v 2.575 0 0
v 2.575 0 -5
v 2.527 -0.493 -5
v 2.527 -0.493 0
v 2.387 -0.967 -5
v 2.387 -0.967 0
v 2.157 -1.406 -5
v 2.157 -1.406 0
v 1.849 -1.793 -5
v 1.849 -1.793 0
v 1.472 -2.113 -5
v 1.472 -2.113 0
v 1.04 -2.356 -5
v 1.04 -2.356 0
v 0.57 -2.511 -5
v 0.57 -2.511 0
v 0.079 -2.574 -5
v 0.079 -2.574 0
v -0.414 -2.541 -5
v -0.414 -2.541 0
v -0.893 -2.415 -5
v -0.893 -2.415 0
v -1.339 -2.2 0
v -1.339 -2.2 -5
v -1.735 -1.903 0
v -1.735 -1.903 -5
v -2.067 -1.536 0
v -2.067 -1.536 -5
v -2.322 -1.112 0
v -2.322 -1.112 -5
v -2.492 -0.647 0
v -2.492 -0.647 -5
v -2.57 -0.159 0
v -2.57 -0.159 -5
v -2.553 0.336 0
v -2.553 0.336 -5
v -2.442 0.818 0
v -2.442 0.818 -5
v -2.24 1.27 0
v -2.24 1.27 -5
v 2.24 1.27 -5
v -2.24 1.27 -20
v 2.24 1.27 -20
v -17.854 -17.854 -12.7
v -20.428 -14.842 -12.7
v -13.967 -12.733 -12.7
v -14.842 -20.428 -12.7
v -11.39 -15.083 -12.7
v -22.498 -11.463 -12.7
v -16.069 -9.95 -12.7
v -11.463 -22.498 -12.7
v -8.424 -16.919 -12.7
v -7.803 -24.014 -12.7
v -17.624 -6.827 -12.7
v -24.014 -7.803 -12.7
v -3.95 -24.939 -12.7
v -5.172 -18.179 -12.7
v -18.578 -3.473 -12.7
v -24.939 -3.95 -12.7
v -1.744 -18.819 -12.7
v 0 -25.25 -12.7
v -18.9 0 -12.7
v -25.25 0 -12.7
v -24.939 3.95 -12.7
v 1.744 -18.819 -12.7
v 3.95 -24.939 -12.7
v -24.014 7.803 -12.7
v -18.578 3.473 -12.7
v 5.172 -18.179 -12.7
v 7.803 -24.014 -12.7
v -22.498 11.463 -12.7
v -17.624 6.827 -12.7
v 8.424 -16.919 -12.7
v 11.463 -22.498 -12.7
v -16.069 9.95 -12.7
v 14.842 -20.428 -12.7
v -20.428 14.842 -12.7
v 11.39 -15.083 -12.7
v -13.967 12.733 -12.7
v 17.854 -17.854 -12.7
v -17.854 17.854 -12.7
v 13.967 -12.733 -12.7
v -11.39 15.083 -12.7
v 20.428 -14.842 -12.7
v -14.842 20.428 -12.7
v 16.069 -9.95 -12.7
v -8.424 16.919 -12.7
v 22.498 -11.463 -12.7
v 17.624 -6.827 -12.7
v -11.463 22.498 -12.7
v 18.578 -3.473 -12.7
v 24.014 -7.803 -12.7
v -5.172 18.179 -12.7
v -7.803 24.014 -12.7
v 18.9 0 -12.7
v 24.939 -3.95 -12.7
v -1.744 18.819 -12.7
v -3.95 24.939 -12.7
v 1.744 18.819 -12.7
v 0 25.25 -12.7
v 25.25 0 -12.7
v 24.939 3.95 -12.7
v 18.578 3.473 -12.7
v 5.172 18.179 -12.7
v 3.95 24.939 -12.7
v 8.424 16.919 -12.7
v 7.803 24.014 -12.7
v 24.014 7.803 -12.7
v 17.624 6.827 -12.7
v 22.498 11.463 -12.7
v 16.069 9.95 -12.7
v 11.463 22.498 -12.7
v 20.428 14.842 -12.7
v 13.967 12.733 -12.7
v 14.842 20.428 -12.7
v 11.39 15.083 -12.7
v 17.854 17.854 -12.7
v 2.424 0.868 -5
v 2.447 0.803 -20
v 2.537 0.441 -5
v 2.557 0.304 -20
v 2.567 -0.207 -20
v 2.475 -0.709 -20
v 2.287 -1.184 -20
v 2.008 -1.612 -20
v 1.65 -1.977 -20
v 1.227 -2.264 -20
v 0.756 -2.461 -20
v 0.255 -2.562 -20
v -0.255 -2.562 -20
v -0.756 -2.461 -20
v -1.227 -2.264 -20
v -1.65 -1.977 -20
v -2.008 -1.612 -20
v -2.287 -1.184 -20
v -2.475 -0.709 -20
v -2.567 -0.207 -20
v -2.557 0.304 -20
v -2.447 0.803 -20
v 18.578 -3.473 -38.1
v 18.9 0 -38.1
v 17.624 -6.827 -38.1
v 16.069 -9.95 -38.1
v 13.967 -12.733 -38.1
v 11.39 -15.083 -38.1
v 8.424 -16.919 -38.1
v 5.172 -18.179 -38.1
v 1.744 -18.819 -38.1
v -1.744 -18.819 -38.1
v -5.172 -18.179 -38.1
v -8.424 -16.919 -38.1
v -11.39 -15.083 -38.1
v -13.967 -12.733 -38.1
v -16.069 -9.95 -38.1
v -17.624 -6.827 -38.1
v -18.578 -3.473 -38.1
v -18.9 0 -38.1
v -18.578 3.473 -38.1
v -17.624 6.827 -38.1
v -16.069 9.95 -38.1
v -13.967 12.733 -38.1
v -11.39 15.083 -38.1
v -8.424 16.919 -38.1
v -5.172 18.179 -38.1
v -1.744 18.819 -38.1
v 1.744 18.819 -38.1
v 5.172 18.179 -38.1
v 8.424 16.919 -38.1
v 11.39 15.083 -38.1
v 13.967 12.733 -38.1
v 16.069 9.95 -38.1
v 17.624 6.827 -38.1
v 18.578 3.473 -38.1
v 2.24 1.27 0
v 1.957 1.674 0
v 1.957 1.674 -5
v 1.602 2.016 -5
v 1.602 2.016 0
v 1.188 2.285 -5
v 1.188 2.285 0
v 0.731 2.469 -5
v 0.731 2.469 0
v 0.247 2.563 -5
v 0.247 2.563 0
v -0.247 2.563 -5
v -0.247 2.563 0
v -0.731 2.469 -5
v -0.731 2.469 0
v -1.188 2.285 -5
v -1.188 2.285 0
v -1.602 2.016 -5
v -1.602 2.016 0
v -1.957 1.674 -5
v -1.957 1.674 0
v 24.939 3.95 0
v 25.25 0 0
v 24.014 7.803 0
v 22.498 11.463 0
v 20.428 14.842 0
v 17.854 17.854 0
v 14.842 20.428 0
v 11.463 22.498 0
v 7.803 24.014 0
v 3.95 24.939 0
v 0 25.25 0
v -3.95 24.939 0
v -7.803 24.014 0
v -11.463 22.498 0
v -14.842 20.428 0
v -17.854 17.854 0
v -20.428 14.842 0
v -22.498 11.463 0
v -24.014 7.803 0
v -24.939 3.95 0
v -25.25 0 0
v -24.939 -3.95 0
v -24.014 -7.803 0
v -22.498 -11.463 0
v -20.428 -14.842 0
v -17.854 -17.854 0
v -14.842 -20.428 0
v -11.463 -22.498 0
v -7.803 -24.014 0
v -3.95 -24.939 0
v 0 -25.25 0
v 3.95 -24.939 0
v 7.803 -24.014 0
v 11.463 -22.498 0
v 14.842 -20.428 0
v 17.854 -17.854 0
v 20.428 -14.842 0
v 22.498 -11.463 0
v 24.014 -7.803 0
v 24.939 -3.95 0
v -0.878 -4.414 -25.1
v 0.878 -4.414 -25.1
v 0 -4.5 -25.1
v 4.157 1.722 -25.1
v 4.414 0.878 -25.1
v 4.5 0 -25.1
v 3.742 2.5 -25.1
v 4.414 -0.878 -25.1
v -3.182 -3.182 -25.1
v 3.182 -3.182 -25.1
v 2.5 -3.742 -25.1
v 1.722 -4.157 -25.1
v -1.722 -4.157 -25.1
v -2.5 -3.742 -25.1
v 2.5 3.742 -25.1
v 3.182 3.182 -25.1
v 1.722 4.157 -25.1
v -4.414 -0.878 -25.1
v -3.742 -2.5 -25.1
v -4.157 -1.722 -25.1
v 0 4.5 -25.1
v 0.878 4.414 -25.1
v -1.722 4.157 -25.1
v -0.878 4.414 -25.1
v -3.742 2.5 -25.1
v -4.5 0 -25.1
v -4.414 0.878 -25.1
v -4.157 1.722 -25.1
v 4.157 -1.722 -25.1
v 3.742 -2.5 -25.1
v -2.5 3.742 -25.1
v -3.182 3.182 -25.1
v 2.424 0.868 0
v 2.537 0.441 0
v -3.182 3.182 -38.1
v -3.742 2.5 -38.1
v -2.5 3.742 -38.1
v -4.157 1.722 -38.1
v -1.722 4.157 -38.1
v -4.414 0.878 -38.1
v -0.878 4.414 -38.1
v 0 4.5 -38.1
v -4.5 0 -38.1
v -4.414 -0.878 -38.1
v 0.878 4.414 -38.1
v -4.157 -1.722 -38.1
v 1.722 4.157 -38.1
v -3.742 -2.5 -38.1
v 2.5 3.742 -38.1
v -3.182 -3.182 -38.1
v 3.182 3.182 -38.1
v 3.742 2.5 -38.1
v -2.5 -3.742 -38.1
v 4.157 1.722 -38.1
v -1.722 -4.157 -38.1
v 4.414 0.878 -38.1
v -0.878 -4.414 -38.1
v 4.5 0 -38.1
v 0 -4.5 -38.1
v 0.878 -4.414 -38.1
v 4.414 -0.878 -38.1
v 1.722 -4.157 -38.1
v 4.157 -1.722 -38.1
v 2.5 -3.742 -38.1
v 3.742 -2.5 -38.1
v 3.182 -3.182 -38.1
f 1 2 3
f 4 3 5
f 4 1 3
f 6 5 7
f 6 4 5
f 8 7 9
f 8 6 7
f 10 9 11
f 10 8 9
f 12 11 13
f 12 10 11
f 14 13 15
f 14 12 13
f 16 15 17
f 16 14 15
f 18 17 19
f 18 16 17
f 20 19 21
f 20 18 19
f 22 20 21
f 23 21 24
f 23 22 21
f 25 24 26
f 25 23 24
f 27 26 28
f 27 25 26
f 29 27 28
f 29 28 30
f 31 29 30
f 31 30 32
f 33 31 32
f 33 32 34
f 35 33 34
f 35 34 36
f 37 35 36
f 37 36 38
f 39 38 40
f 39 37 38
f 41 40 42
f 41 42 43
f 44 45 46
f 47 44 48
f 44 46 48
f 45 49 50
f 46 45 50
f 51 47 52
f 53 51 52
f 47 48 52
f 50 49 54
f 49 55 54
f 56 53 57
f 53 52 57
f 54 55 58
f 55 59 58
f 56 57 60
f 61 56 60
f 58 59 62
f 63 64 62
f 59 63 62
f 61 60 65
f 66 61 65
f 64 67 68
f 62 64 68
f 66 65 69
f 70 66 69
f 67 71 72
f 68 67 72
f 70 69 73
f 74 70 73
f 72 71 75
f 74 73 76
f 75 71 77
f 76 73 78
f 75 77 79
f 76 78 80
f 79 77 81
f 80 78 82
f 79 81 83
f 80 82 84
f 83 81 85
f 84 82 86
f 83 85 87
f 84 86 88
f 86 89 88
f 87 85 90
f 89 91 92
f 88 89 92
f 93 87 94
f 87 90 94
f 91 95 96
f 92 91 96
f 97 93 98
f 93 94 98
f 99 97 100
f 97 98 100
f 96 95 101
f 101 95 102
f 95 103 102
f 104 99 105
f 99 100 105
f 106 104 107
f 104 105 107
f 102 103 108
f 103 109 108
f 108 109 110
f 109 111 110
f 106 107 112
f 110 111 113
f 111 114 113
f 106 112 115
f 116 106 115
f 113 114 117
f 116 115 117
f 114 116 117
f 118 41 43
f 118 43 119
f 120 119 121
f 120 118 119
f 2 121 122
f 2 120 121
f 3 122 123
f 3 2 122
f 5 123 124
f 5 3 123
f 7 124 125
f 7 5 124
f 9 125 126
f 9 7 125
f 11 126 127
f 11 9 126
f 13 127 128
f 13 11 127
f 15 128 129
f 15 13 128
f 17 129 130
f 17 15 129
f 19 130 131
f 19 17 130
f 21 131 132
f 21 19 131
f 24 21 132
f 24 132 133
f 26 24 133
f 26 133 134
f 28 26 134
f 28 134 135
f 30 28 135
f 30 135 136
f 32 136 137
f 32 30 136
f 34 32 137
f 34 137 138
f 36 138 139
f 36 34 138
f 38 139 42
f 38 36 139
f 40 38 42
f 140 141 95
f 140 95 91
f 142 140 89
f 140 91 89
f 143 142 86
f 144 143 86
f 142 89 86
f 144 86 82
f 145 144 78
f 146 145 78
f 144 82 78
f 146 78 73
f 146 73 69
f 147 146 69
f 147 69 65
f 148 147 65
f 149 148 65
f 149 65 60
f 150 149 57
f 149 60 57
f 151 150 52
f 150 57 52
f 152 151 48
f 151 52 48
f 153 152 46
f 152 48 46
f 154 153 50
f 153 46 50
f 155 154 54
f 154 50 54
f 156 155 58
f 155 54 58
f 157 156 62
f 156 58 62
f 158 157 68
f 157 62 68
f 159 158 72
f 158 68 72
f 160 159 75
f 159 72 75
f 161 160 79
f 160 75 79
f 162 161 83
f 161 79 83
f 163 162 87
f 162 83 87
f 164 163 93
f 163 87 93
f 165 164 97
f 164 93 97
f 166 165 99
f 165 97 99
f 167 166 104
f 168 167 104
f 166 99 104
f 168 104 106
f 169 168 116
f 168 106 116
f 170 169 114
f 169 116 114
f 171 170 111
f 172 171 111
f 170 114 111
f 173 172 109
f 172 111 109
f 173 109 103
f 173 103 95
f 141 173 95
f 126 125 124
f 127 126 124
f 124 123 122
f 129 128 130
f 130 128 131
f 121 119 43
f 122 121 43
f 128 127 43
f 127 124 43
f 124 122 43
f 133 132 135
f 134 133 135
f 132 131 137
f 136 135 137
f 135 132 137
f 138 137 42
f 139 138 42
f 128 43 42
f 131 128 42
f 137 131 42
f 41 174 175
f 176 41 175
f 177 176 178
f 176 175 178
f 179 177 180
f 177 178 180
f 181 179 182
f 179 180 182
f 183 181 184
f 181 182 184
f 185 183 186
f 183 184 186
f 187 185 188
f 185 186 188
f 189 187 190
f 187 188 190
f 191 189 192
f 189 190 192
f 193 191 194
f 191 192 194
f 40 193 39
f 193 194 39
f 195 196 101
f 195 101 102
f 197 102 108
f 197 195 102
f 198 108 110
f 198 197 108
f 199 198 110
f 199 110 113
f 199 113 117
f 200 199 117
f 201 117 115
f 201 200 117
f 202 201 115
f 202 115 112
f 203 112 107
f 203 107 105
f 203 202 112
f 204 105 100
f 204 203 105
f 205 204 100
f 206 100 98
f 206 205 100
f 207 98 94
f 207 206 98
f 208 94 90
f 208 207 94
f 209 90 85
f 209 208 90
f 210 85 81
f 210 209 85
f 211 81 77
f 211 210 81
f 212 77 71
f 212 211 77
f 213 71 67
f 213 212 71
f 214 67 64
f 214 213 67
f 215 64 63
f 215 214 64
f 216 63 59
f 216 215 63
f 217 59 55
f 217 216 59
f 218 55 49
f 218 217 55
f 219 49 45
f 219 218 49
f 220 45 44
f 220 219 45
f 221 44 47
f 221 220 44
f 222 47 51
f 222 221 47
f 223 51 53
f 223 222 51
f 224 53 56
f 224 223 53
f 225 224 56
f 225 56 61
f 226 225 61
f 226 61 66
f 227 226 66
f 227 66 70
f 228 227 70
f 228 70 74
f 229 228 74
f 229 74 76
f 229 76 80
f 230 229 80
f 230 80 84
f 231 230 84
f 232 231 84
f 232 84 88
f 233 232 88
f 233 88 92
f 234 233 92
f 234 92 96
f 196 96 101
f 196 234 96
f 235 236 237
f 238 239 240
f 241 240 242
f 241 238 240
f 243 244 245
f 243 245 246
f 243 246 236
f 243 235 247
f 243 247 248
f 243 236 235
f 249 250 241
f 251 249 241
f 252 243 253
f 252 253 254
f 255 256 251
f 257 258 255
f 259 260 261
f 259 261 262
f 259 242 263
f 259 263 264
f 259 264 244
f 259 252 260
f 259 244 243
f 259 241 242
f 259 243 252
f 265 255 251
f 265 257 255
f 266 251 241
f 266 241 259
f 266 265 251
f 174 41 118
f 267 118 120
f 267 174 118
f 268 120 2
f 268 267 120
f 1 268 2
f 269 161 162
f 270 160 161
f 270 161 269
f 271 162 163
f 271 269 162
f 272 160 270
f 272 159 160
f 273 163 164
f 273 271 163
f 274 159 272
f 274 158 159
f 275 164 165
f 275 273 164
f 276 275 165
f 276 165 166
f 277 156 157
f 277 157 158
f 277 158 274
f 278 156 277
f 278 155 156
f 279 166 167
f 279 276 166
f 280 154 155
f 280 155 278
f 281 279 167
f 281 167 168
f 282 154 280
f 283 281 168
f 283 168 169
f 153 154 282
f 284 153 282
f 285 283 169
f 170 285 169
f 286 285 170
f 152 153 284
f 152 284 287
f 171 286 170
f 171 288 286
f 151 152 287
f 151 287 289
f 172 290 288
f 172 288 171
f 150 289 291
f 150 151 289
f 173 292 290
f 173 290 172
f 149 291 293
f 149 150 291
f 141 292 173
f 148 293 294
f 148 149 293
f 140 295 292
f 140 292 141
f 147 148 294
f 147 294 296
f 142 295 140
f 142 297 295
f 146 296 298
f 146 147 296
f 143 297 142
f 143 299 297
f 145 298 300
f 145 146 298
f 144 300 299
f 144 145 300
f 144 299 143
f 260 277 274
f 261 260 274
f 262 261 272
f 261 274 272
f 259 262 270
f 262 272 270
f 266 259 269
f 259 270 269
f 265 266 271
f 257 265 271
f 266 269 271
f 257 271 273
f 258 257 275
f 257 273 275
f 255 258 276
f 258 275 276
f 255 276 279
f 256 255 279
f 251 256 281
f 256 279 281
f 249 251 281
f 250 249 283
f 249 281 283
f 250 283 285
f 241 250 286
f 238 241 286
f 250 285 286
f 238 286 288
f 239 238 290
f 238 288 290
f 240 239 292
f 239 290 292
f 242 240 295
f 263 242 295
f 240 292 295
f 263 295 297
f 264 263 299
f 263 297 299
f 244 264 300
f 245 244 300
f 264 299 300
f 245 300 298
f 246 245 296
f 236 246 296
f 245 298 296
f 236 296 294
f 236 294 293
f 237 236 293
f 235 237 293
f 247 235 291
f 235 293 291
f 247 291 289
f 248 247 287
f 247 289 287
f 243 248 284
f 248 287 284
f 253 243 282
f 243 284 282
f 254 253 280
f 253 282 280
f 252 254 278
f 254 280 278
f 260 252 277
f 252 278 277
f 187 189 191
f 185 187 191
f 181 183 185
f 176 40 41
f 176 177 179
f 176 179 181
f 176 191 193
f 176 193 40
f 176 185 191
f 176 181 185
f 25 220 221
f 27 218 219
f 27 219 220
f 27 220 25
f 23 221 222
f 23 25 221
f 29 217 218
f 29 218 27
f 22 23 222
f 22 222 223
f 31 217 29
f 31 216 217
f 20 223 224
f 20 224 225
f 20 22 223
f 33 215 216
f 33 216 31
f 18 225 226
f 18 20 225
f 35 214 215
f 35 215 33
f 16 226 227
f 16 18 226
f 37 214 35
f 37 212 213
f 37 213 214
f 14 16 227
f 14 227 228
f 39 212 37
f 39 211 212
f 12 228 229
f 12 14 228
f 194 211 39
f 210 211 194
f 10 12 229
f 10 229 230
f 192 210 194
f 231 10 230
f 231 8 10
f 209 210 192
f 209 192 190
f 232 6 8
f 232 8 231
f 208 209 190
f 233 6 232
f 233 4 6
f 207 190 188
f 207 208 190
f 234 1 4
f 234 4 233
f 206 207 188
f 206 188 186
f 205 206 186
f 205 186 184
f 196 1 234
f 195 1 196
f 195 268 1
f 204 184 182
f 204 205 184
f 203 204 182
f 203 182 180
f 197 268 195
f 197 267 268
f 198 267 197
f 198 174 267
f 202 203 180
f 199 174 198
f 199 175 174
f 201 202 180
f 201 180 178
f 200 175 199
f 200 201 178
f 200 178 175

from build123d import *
from build123d.topology import SkipClean

# Parameters (mm, degrees)
SKETCH1_R           = 25.25
BOSS_EXTRUDE1_DEPTH = 12.7
SKETCH2_R           = 18.9
BOSS_EXTRUDE2_DEPTH = 25.4
SKETCH3_R           = 4.5
CUT_EXTRUDE1_DEPTH  = 13
CUT_EXTRUDE2_DEPTH  = 20
SKETCH5_R           = 2.575
CUT_EXTRUDE3_DEPTH  = 5


with BuildPart() as part:
    # Sketch1 → Boss-Extrude1 (new body)
    with BuildSketch(Plane.XY):
        Circle(SKETCH1_R)
    extrude(amount=-BOSS_EXTRUDE1_DEPTH)

    # Sketch2 → Boss-Extrude2 (add)
    with BuildSketch(Plane(origin=(0, 0, -12.7), x_dir=(-1, 0, 0), z_dir=(0, 0, -1))):
        with Locations(Location((0, 0, 0), (0, 0, 180))):
            Circle(SKETCH2_R)
    extrude(amount=BOSS_EXTRUDE2_DEPTH)

    # Sketch3 → Cut-Extrude1 (cut)
    with BuildSketch(Plane(origin=(0, 0, -38.1), x_dir=(-1, 0, 0), z_dir=(0, 0, -1))):
        Circle(SKETCH3_R)
    extrude(amount=-CUT_EXTRUDE1_DEPTH, mode=Mode.SUBTRACT)

    # Sketch4 → Cut-Extrude2 (cut)
    with BuildSketch(Plane.XY):
        with BuildLine():
            Line((-2.24, 1.270049212), (2.24, 1.270049212))
            ThreePointArc((2.24, 1.270049212), (0, -2.575), (-2.24, 1.270049212))
        make_face()
    extrude(amount=-CUT_EXTRUDE2_DEPTH, mode=Mode.SUBTRACT)

    # Sketch5 → Cut-Extrude3 (cut)
    with SkipClean():  # the faces are left unmerged after this step: merging them gives an invalid solid
        with BuildSketch(Plane.XY):
            Circle(SKETCH5_R)
        extrude(amount=-CUT_EXTRUDE3_DEPTH, mode=Mode.SUBTRACT)


solid = part.part
